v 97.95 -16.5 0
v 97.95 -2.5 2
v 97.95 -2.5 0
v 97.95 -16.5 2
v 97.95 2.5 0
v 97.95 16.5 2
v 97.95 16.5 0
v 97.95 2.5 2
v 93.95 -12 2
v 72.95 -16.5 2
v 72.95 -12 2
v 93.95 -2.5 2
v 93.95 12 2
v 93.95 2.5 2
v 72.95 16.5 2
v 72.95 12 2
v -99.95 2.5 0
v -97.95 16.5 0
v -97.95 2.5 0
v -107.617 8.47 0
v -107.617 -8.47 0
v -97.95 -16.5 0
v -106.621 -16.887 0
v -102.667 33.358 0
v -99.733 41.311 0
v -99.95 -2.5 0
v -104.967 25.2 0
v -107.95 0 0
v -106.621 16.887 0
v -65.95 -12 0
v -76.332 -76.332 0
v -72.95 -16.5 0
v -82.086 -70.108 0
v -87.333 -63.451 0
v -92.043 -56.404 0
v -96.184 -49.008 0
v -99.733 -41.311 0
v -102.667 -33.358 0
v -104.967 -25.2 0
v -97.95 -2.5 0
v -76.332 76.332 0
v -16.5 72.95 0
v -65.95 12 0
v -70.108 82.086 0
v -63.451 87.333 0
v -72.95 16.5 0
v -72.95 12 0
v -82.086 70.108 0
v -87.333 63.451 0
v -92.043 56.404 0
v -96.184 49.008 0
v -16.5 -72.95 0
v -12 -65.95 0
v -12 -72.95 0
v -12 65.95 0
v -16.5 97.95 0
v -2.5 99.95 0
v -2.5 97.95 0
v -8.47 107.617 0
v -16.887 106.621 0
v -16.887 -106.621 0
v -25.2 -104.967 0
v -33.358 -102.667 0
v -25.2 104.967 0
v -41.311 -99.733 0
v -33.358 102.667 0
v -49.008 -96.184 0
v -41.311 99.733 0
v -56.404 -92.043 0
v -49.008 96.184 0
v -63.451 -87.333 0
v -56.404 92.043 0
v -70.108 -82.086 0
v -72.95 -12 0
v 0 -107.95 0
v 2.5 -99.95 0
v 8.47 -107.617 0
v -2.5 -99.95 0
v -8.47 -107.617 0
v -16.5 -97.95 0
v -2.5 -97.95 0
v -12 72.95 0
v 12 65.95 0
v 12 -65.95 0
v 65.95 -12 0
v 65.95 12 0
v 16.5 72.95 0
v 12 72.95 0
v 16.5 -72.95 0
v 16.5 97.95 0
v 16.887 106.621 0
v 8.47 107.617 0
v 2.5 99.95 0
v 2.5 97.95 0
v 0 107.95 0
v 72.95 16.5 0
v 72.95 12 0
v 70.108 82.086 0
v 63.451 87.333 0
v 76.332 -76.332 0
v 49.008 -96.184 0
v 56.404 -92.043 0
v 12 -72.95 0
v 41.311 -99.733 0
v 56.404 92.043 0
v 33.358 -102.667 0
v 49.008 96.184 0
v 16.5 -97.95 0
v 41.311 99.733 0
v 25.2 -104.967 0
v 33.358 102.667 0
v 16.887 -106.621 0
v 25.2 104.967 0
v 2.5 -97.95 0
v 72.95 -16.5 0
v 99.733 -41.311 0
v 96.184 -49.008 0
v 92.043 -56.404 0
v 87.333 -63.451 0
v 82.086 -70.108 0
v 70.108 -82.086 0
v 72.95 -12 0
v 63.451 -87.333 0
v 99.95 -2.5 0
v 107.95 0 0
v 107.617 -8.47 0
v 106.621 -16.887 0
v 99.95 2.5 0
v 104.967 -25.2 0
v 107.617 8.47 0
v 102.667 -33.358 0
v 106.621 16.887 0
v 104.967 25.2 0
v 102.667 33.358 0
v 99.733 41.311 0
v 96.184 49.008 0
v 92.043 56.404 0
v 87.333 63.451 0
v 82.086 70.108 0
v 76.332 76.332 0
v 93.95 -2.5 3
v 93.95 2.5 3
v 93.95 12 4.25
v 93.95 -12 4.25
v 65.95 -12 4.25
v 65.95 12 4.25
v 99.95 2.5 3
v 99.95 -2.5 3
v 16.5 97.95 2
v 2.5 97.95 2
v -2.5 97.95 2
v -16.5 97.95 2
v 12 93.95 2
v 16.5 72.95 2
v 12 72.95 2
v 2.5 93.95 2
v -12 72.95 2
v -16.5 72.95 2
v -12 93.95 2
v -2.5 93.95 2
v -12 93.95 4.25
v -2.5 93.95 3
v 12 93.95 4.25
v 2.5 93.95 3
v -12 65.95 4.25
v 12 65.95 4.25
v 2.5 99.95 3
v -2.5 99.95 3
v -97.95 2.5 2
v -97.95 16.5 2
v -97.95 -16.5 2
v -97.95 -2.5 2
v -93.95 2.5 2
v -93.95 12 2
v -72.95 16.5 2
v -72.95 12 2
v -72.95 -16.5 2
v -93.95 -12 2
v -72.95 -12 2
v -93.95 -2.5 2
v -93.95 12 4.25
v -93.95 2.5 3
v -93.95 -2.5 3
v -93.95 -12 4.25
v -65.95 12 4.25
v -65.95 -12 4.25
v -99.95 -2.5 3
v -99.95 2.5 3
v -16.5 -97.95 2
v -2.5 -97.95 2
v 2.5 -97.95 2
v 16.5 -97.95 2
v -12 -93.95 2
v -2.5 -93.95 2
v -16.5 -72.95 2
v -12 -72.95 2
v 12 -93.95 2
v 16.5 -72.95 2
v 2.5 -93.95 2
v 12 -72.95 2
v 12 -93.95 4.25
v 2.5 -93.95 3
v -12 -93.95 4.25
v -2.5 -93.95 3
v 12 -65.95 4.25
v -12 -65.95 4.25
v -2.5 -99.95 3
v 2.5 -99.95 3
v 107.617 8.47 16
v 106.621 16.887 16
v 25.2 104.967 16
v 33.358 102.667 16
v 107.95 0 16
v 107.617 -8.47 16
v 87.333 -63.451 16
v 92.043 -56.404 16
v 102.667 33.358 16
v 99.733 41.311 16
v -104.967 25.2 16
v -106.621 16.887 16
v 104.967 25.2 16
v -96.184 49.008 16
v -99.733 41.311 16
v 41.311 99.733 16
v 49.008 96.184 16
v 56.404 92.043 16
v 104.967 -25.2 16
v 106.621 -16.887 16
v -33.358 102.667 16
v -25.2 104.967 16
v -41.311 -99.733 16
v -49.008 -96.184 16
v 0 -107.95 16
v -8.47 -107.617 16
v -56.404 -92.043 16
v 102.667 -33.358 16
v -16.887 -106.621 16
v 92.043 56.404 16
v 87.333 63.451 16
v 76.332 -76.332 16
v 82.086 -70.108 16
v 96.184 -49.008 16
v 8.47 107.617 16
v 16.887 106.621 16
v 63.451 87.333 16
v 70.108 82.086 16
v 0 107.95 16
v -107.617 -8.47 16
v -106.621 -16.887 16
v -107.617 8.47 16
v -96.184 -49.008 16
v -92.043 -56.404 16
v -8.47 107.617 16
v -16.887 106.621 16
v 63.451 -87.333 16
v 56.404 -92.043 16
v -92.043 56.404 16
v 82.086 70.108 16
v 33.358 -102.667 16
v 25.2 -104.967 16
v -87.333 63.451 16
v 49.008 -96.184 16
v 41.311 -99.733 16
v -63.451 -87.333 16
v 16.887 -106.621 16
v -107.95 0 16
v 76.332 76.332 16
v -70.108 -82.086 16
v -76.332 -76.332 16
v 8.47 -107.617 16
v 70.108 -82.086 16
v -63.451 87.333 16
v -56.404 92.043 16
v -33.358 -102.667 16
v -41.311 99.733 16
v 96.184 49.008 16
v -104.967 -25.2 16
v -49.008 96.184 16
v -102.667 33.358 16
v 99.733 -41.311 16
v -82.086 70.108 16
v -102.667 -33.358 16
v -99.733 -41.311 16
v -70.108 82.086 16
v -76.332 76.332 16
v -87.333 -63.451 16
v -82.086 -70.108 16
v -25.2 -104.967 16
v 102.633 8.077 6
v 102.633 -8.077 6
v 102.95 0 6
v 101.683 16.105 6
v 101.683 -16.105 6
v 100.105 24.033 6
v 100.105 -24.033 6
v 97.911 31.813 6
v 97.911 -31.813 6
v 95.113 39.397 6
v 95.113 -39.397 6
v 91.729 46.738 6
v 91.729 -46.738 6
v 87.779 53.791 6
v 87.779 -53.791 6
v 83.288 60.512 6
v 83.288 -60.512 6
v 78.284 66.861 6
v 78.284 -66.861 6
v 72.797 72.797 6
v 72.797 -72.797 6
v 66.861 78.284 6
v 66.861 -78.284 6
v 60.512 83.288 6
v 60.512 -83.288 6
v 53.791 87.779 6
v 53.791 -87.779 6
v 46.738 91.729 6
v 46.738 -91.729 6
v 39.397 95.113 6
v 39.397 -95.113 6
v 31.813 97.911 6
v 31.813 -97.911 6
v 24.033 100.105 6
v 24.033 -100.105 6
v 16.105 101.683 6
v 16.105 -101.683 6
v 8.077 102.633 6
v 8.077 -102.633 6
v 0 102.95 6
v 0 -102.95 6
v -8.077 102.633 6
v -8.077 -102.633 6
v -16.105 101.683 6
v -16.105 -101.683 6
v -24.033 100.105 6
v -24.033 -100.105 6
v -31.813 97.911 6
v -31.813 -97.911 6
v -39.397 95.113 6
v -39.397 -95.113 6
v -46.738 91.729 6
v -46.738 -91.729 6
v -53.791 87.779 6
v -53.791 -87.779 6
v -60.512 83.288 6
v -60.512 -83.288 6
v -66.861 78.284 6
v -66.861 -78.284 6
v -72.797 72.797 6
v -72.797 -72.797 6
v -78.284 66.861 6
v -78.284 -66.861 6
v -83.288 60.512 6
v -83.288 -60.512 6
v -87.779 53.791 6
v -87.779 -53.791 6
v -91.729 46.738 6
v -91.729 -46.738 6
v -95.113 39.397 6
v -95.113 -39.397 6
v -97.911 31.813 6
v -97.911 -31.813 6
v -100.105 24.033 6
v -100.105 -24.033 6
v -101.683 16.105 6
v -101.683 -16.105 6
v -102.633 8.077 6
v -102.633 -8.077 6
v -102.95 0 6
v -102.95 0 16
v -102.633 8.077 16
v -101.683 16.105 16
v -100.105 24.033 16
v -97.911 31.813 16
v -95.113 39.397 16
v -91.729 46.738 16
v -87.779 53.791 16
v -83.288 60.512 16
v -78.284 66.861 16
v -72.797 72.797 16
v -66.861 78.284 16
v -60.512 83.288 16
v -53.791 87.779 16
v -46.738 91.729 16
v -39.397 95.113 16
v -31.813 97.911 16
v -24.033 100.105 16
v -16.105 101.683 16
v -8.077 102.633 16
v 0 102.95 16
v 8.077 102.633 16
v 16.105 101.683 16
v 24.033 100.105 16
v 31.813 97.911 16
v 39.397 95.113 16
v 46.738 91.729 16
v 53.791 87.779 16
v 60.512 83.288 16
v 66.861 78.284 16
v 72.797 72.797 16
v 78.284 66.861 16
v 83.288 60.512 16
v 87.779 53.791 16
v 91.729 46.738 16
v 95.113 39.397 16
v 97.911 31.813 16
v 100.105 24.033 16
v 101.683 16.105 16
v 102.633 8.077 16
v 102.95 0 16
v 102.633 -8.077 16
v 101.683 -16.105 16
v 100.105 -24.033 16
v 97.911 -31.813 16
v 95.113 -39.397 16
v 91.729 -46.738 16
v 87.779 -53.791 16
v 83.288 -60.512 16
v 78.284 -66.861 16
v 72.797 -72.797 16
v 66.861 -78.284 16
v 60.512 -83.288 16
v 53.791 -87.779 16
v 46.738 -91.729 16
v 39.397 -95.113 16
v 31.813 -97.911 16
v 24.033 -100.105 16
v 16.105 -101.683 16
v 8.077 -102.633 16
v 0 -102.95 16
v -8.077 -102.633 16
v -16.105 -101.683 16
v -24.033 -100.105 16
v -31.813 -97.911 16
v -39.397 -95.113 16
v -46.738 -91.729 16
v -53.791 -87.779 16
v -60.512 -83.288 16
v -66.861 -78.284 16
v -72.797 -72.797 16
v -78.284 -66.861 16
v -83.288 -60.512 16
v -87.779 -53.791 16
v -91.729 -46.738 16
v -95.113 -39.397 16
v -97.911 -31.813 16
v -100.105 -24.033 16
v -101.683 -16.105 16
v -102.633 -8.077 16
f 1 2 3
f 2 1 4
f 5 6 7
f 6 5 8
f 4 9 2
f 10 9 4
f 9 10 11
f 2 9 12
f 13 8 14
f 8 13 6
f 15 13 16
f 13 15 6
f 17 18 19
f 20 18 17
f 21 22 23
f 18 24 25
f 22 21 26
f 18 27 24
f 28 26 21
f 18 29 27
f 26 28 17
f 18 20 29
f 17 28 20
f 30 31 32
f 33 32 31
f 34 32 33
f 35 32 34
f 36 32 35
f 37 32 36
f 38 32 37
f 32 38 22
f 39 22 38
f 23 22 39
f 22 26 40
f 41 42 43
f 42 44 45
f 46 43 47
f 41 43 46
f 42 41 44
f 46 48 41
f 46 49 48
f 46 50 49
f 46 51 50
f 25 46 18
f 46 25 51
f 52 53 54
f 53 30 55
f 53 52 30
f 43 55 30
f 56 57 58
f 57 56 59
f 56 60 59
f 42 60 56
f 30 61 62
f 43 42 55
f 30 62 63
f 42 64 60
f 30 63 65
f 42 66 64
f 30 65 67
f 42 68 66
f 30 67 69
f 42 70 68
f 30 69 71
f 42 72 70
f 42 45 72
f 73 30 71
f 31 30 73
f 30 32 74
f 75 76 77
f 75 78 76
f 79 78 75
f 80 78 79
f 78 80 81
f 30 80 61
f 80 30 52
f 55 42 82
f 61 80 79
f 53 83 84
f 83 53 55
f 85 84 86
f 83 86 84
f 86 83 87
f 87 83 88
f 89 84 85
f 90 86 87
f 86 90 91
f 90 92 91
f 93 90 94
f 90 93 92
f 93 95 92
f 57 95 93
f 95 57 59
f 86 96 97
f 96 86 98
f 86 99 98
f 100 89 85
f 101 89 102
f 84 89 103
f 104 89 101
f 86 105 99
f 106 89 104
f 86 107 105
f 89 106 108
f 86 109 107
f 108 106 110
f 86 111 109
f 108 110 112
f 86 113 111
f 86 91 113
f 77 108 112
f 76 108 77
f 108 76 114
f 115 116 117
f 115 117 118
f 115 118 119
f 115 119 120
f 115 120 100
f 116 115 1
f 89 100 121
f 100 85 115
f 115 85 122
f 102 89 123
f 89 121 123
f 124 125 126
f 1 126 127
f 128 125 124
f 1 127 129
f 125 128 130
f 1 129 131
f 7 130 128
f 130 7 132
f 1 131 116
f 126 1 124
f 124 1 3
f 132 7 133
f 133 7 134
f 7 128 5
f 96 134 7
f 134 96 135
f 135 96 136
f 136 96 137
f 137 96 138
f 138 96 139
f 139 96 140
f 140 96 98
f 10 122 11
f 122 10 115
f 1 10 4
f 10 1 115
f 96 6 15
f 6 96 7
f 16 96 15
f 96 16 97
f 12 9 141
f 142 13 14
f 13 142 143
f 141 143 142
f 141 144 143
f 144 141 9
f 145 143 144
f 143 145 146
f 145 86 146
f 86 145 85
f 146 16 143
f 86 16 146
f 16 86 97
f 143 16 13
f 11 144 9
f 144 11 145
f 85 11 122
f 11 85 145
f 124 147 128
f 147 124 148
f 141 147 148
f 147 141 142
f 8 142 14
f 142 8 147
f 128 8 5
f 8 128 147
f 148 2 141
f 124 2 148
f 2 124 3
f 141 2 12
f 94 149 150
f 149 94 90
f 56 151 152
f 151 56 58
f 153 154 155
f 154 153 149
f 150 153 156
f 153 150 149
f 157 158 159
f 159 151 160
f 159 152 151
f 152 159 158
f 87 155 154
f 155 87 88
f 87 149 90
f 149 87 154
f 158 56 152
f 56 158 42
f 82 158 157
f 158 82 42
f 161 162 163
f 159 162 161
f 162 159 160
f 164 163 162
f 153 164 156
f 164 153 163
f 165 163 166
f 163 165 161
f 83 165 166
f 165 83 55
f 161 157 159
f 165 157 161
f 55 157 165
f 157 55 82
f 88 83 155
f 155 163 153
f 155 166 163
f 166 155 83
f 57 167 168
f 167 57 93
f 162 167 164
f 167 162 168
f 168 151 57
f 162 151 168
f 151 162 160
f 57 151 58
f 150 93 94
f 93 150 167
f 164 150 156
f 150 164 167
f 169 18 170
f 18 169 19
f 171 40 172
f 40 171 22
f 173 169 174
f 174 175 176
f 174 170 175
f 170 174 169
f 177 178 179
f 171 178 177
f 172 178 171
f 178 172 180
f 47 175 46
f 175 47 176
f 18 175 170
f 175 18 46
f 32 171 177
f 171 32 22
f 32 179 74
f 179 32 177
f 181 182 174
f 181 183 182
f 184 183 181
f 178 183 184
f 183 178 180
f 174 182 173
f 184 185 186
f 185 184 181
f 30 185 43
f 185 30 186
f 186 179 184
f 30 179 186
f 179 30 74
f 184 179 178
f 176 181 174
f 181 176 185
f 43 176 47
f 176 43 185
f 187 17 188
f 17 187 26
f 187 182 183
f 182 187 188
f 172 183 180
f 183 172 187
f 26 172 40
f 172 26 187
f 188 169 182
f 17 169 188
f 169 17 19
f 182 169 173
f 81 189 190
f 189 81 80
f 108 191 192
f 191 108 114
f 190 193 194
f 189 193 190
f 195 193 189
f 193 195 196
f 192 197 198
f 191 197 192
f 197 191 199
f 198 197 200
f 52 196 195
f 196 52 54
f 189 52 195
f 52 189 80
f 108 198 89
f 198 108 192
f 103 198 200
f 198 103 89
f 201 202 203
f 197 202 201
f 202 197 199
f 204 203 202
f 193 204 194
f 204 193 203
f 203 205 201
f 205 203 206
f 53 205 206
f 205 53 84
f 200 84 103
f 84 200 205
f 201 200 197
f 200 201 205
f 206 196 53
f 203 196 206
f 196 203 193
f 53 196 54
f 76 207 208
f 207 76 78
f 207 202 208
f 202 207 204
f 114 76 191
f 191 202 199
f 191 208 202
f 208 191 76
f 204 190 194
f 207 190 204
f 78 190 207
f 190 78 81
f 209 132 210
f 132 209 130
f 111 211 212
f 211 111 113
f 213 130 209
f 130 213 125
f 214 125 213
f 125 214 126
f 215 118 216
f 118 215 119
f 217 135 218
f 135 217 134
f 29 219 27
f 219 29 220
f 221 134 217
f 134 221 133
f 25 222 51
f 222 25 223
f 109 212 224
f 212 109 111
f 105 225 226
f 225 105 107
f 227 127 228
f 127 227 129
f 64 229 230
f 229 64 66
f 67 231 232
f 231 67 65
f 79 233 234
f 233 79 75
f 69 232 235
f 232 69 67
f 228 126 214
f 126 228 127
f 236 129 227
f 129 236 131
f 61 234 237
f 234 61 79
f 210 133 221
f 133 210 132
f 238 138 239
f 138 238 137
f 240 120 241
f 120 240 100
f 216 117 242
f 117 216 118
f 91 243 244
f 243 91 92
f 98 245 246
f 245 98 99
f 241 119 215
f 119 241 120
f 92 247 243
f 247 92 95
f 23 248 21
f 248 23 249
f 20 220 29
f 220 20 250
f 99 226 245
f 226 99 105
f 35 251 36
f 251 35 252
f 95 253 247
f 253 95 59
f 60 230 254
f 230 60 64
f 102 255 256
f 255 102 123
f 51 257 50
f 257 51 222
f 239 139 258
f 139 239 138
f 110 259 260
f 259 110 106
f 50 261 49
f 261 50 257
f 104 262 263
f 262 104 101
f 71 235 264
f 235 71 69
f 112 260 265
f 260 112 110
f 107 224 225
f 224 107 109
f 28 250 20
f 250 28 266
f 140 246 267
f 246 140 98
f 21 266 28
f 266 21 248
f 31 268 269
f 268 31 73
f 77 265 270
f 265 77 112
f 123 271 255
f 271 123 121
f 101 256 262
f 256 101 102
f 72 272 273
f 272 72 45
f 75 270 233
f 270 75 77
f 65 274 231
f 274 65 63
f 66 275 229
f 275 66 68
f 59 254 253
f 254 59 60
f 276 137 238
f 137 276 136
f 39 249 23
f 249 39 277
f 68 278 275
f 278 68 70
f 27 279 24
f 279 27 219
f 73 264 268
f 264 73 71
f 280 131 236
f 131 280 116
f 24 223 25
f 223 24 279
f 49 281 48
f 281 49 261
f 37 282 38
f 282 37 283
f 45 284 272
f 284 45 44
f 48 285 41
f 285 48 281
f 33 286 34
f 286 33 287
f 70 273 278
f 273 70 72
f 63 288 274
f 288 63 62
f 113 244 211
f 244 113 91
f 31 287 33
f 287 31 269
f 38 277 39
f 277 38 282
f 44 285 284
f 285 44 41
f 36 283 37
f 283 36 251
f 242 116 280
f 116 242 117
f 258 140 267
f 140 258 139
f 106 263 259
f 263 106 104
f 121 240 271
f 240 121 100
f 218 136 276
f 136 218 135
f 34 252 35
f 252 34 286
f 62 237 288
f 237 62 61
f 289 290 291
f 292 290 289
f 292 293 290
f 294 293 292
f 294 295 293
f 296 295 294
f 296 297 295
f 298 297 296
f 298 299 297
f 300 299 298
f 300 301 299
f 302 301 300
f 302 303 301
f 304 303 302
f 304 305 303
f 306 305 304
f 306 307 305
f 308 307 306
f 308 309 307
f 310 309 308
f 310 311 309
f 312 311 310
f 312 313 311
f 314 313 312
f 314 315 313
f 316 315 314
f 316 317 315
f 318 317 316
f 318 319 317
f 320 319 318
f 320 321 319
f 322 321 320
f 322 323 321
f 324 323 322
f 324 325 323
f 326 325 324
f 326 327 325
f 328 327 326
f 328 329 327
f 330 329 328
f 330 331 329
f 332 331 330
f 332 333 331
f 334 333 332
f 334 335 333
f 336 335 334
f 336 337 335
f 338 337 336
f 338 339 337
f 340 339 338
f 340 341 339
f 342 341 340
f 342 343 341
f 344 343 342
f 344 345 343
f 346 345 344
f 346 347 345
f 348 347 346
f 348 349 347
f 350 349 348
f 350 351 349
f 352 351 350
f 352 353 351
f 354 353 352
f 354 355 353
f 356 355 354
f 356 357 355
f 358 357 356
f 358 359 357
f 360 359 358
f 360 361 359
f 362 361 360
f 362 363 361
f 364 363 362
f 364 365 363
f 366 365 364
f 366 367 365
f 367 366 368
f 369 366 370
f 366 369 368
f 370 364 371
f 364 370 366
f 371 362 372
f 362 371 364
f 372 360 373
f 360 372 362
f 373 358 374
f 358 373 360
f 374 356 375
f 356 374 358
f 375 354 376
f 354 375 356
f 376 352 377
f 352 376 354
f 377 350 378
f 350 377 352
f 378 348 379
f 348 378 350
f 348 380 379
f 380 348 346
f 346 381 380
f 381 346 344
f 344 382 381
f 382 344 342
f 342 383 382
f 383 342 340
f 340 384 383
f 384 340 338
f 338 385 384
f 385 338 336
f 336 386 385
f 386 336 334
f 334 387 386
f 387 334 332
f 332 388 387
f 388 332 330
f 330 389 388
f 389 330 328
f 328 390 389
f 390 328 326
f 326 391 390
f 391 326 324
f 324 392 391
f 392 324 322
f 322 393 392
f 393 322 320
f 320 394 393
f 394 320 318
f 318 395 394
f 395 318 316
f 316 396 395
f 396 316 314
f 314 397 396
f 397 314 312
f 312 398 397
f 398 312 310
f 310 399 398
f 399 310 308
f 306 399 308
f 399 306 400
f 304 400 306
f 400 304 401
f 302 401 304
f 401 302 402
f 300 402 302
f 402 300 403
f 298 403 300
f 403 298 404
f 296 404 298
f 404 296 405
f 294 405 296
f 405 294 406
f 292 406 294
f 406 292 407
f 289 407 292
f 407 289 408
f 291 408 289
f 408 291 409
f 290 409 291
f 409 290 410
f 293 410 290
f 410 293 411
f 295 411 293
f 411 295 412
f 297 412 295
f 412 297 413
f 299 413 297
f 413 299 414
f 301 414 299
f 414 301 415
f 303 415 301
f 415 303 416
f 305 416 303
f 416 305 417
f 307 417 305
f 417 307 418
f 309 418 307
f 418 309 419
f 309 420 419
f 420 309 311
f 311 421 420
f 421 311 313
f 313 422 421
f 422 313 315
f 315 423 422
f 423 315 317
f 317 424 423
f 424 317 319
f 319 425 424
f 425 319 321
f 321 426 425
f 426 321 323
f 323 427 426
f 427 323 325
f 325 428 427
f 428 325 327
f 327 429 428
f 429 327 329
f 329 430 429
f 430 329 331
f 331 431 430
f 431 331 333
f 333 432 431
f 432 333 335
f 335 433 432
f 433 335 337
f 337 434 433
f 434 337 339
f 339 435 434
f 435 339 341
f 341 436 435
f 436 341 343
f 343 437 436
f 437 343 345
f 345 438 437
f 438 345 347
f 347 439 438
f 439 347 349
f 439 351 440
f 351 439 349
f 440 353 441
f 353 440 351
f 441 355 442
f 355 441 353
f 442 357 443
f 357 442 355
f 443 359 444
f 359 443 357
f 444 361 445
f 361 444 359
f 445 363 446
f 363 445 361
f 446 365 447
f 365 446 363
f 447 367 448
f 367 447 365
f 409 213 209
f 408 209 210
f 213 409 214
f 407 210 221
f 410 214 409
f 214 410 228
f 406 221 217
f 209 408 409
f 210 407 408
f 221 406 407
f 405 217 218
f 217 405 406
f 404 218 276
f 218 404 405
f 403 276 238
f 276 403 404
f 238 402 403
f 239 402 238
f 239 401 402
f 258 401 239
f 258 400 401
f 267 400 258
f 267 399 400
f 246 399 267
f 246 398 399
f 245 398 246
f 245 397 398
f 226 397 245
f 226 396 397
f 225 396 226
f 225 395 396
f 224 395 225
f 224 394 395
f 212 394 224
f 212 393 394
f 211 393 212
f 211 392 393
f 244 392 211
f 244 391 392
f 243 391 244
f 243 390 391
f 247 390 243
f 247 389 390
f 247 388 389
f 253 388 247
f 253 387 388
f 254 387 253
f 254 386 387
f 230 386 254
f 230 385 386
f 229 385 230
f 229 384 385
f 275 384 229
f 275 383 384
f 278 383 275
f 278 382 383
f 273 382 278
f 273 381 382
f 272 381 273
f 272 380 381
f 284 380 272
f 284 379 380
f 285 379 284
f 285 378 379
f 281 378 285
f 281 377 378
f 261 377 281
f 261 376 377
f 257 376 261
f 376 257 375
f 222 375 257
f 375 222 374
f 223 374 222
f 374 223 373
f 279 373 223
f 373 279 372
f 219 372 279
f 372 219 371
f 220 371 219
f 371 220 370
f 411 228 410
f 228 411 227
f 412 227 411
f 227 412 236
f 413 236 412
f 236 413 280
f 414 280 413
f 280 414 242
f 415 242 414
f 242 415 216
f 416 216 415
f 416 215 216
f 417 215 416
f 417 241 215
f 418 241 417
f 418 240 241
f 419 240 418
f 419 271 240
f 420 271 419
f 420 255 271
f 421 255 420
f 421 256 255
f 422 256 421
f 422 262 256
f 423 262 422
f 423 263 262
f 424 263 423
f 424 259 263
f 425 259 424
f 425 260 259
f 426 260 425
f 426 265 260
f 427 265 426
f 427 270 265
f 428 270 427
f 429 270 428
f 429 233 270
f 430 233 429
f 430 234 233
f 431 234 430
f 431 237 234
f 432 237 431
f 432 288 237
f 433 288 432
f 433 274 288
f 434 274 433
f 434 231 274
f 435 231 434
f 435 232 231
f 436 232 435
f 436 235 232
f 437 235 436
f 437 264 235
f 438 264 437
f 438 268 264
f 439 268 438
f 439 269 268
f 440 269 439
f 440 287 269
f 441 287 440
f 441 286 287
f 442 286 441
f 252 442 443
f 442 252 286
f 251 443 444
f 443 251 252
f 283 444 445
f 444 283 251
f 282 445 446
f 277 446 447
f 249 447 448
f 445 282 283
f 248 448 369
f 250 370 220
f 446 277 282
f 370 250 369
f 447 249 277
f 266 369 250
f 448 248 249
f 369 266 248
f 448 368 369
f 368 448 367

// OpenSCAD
$fn=80;

din = 8.5;

d = din * 25.4;
r = d / 2;
h = 6;

difference(){

    linear_extrude(h){
        circle(d = d);
     }

    for (angle = [0, 90, 180, 270]){
        rotate([0, 0, angle]) {
            
            translate([r - 10, -16.5, 0])
            translate([-25, 0, 0])
            cube([25, 7, 2]);


            translate([r - 10-7, -16.5, 0])
            cube([7, 33, 2]);

            translate([r - 10, 16.5-7, 0])
            translate([-25, 0, 0])
            cube([25, 7, 2]);

            translate([r - 14 - 28, -12, 0])
            cube([28, 24, 4.25]);

            translate([r - 18, -2.5, 0])
            cube([10, 5, 3]);
        }
    }


}


rotate_extrude(){
translate([r-5, h, 0])
square([5,10]);
}
